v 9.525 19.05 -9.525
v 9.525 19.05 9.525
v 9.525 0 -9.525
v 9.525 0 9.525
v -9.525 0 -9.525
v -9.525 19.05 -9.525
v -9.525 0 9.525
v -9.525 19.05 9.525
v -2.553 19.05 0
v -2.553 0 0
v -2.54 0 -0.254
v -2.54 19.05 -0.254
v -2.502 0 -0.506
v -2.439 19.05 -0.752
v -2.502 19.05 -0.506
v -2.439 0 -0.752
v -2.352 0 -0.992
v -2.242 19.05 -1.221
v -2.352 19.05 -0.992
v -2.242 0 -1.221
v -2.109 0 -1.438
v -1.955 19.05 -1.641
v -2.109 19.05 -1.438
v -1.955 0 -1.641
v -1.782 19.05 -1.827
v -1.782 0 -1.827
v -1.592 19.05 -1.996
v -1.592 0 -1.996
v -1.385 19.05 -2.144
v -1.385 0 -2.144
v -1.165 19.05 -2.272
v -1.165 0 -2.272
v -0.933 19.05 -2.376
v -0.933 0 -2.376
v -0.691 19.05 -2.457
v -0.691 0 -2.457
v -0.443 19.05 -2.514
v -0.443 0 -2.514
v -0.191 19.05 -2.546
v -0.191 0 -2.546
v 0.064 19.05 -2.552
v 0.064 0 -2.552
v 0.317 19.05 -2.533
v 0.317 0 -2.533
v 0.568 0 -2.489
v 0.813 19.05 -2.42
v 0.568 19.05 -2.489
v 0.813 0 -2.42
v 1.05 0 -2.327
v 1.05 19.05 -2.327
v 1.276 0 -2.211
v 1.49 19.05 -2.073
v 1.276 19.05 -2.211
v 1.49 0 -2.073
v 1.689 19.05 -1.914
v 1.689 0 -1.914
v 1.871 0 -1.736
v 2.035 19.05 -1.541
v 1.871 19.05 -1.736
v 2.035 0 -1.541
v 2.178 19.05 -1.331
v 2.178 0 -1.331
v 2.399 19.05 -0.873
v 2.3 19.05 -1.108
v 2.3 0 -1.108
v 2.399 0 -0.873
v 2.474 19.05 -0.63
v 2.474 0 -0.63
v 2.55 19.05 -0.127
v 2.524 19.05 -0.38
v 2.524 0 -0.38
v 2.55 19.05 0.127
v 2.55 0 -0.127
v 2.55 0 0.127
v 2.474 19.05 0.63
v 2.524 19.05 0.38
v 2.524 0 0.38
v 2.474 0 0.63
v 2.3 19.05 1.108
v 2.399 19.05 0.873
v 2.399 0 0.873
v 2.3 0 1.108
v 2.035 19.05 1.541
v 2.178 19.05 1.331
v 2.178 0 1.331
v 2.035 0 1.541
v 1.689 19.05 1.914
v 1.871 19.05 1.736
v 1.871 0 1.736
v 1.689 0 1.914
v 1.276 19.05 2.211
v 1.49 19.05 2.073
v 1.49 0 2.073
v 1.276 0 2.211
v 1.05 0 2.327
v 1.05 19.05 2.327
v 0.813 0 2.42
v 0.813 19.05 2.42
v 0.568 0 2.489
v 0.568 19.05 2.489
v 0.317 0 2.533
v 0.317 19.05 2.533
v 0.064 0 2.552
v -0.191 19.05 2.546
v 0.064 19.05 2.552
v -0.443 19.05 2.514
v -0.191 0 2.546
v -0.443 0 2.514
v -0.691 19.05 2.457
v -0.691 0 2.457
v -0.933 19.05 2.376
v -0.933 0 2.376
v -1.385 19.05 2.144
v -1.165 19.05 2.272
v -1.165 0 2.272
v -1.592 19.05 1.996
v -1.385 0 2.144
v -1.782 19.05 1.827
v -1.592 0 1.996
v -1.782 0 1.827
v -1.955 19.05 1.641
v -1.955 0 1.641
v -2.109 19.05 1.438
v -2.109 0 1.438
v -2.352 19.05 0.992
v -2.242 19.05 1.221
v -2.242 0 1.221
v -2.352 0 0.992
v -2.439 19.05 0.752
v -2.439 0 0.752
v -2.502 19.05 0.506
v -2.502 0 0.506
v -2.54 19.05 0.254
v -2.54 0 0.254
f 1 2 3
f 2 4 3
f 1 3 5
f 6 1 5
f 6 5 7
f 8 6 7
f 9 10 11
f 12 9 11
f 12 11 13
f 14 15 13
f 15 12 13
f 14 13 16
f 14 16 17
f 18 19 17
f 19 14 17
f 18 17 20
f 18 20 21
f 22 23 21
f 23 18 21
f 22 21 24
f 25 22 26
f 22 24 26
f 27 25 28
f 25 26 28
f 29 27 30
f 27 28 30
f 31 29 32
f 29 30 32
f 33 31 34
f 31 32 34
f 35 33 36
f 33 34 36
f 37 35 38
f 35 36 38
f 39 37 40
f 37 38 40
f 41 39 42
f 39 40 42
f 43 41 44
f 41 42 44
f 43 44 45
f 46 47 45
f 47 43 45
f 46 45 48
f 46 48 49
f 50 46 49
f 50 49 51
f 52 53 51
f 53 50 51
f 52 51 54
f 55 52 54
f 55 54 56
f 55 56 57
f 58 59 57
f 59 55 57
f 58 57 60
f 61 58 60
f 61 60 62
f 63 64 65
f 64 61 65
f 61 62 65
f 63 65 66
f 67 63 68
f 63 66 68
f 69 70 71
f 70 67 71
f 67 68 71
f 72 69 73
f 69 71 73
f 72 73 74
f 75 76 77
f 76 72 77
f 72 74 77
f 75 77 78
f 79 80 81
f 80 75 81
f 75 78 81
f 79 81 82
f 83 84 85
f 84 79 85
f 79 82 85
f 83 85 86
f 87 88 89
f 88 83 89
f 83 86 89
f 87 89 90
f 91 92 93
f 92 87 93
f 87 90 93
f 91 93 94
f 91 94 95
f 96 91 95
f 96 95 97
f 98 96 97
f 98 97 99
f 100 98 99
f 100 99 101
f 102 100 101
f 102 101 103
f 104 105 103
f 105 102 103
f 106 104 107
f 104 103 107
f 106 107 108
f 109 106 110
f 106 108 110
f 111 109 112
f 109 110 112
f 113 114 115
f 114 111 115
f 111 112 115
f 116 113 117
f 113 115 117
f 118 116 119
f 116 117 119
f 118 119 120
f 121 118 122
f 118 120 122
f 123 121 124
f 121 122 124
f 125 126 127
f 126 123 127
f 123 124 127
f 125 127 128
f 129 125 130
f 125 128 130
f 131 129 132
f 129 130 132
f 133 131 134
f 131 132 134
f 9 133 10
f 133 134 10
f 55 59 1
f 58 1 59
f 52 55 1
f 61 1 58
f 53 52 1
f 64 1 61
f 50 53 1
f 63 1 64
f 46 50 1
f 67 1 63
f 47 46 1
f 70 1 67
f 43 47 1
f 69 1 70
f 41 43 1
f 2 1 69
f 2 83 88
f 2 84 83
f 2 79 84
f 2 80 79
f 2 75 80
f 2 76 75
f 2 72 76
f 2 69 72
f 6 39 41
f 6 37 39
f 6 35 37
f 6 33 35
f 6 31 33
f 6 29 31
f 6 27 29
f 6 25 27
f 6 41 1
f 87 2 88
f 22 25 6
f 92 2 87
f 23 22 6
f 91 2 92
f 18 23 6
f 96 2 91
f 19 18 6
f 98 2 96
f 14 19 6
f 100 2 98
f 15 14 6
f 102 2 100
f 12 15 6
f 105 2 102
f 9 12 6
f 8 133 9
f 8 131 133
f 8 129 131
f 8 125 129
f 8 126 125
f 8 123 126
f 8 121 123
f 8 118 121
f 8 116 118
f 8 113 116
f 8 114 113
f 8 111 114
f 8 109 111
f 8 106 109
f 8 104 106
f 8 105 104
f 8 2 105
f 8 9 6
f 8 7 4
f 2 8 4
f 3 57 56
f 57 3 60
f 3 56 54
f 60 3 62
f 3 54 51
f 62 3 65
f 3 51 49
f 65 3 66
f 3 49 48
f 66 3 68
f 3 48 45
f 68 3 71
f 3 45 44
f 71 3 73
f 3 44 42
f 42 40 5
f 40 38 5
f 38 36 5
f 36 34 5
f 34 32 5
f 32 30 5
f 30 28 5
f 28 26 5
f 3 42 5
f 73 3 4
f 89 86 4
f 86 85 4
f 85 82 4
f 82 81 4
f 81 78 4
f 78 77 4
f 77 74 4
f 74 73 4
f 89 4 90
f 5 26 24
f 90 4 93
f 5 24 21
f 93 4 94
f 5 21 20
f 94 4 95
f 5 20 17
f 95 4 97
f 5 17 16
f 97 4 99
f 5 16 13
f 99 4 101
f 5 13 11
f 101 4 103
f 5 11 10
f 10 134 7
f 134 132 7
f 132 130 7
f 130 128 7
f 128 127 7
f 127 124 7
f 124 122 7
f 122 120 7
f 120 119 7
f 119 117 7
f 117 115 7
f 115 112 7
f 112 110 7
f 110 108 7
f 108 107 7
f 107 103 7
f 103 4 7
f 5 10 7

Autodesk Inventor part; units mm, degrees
ref_plane "YZ Plane" through (0, 0, 0) normal (1, 0, 0) x (0, 1, 0)
ref_plane "XZ Plane" through (0, 0, 0) normal (0, 1, 0) x (-1, 0, 0)
ref_plane "XY Plane" through (0, 0, 0) normal (0, 0, 1) x (1, 0, 0)
sketch "Sketch1" plane through (0, 0, 0) normal (0, 1, 0) x (-1, 0, 0)
  line L0 (-9.525, -9.525) -> (9.525, -9.525)
  line L1 (9.525, -9.525) -> (9.525, 9.525)
  line L2 (9.525, 9.525) -> (-9.525, 9.525)
  line L3 (-9.525, 9.525) -> (-9.525, -9.525)
  line L4 (-9.525, -9.525) -> (9.525, 9.525) construction
  line L5 (9.525, -9.525) -> (-9.525, 9.525) construction
  circle A0 centre (0, 0) radius 2.5527
  dimension "d0" = 19.05
  dimension "d1" = 19.05
  dimension "d2" = 5.1054
extrude "Extrusion1" add sketch "Sketch1" along normal blind 19.05
thread "Thread1" size "1/4-20 UNC" class "2B" standard "ANSI Unified Screw Threads" full length
properties part number "STRU_024_BilletBlock2" material "Aluminum 6061"
